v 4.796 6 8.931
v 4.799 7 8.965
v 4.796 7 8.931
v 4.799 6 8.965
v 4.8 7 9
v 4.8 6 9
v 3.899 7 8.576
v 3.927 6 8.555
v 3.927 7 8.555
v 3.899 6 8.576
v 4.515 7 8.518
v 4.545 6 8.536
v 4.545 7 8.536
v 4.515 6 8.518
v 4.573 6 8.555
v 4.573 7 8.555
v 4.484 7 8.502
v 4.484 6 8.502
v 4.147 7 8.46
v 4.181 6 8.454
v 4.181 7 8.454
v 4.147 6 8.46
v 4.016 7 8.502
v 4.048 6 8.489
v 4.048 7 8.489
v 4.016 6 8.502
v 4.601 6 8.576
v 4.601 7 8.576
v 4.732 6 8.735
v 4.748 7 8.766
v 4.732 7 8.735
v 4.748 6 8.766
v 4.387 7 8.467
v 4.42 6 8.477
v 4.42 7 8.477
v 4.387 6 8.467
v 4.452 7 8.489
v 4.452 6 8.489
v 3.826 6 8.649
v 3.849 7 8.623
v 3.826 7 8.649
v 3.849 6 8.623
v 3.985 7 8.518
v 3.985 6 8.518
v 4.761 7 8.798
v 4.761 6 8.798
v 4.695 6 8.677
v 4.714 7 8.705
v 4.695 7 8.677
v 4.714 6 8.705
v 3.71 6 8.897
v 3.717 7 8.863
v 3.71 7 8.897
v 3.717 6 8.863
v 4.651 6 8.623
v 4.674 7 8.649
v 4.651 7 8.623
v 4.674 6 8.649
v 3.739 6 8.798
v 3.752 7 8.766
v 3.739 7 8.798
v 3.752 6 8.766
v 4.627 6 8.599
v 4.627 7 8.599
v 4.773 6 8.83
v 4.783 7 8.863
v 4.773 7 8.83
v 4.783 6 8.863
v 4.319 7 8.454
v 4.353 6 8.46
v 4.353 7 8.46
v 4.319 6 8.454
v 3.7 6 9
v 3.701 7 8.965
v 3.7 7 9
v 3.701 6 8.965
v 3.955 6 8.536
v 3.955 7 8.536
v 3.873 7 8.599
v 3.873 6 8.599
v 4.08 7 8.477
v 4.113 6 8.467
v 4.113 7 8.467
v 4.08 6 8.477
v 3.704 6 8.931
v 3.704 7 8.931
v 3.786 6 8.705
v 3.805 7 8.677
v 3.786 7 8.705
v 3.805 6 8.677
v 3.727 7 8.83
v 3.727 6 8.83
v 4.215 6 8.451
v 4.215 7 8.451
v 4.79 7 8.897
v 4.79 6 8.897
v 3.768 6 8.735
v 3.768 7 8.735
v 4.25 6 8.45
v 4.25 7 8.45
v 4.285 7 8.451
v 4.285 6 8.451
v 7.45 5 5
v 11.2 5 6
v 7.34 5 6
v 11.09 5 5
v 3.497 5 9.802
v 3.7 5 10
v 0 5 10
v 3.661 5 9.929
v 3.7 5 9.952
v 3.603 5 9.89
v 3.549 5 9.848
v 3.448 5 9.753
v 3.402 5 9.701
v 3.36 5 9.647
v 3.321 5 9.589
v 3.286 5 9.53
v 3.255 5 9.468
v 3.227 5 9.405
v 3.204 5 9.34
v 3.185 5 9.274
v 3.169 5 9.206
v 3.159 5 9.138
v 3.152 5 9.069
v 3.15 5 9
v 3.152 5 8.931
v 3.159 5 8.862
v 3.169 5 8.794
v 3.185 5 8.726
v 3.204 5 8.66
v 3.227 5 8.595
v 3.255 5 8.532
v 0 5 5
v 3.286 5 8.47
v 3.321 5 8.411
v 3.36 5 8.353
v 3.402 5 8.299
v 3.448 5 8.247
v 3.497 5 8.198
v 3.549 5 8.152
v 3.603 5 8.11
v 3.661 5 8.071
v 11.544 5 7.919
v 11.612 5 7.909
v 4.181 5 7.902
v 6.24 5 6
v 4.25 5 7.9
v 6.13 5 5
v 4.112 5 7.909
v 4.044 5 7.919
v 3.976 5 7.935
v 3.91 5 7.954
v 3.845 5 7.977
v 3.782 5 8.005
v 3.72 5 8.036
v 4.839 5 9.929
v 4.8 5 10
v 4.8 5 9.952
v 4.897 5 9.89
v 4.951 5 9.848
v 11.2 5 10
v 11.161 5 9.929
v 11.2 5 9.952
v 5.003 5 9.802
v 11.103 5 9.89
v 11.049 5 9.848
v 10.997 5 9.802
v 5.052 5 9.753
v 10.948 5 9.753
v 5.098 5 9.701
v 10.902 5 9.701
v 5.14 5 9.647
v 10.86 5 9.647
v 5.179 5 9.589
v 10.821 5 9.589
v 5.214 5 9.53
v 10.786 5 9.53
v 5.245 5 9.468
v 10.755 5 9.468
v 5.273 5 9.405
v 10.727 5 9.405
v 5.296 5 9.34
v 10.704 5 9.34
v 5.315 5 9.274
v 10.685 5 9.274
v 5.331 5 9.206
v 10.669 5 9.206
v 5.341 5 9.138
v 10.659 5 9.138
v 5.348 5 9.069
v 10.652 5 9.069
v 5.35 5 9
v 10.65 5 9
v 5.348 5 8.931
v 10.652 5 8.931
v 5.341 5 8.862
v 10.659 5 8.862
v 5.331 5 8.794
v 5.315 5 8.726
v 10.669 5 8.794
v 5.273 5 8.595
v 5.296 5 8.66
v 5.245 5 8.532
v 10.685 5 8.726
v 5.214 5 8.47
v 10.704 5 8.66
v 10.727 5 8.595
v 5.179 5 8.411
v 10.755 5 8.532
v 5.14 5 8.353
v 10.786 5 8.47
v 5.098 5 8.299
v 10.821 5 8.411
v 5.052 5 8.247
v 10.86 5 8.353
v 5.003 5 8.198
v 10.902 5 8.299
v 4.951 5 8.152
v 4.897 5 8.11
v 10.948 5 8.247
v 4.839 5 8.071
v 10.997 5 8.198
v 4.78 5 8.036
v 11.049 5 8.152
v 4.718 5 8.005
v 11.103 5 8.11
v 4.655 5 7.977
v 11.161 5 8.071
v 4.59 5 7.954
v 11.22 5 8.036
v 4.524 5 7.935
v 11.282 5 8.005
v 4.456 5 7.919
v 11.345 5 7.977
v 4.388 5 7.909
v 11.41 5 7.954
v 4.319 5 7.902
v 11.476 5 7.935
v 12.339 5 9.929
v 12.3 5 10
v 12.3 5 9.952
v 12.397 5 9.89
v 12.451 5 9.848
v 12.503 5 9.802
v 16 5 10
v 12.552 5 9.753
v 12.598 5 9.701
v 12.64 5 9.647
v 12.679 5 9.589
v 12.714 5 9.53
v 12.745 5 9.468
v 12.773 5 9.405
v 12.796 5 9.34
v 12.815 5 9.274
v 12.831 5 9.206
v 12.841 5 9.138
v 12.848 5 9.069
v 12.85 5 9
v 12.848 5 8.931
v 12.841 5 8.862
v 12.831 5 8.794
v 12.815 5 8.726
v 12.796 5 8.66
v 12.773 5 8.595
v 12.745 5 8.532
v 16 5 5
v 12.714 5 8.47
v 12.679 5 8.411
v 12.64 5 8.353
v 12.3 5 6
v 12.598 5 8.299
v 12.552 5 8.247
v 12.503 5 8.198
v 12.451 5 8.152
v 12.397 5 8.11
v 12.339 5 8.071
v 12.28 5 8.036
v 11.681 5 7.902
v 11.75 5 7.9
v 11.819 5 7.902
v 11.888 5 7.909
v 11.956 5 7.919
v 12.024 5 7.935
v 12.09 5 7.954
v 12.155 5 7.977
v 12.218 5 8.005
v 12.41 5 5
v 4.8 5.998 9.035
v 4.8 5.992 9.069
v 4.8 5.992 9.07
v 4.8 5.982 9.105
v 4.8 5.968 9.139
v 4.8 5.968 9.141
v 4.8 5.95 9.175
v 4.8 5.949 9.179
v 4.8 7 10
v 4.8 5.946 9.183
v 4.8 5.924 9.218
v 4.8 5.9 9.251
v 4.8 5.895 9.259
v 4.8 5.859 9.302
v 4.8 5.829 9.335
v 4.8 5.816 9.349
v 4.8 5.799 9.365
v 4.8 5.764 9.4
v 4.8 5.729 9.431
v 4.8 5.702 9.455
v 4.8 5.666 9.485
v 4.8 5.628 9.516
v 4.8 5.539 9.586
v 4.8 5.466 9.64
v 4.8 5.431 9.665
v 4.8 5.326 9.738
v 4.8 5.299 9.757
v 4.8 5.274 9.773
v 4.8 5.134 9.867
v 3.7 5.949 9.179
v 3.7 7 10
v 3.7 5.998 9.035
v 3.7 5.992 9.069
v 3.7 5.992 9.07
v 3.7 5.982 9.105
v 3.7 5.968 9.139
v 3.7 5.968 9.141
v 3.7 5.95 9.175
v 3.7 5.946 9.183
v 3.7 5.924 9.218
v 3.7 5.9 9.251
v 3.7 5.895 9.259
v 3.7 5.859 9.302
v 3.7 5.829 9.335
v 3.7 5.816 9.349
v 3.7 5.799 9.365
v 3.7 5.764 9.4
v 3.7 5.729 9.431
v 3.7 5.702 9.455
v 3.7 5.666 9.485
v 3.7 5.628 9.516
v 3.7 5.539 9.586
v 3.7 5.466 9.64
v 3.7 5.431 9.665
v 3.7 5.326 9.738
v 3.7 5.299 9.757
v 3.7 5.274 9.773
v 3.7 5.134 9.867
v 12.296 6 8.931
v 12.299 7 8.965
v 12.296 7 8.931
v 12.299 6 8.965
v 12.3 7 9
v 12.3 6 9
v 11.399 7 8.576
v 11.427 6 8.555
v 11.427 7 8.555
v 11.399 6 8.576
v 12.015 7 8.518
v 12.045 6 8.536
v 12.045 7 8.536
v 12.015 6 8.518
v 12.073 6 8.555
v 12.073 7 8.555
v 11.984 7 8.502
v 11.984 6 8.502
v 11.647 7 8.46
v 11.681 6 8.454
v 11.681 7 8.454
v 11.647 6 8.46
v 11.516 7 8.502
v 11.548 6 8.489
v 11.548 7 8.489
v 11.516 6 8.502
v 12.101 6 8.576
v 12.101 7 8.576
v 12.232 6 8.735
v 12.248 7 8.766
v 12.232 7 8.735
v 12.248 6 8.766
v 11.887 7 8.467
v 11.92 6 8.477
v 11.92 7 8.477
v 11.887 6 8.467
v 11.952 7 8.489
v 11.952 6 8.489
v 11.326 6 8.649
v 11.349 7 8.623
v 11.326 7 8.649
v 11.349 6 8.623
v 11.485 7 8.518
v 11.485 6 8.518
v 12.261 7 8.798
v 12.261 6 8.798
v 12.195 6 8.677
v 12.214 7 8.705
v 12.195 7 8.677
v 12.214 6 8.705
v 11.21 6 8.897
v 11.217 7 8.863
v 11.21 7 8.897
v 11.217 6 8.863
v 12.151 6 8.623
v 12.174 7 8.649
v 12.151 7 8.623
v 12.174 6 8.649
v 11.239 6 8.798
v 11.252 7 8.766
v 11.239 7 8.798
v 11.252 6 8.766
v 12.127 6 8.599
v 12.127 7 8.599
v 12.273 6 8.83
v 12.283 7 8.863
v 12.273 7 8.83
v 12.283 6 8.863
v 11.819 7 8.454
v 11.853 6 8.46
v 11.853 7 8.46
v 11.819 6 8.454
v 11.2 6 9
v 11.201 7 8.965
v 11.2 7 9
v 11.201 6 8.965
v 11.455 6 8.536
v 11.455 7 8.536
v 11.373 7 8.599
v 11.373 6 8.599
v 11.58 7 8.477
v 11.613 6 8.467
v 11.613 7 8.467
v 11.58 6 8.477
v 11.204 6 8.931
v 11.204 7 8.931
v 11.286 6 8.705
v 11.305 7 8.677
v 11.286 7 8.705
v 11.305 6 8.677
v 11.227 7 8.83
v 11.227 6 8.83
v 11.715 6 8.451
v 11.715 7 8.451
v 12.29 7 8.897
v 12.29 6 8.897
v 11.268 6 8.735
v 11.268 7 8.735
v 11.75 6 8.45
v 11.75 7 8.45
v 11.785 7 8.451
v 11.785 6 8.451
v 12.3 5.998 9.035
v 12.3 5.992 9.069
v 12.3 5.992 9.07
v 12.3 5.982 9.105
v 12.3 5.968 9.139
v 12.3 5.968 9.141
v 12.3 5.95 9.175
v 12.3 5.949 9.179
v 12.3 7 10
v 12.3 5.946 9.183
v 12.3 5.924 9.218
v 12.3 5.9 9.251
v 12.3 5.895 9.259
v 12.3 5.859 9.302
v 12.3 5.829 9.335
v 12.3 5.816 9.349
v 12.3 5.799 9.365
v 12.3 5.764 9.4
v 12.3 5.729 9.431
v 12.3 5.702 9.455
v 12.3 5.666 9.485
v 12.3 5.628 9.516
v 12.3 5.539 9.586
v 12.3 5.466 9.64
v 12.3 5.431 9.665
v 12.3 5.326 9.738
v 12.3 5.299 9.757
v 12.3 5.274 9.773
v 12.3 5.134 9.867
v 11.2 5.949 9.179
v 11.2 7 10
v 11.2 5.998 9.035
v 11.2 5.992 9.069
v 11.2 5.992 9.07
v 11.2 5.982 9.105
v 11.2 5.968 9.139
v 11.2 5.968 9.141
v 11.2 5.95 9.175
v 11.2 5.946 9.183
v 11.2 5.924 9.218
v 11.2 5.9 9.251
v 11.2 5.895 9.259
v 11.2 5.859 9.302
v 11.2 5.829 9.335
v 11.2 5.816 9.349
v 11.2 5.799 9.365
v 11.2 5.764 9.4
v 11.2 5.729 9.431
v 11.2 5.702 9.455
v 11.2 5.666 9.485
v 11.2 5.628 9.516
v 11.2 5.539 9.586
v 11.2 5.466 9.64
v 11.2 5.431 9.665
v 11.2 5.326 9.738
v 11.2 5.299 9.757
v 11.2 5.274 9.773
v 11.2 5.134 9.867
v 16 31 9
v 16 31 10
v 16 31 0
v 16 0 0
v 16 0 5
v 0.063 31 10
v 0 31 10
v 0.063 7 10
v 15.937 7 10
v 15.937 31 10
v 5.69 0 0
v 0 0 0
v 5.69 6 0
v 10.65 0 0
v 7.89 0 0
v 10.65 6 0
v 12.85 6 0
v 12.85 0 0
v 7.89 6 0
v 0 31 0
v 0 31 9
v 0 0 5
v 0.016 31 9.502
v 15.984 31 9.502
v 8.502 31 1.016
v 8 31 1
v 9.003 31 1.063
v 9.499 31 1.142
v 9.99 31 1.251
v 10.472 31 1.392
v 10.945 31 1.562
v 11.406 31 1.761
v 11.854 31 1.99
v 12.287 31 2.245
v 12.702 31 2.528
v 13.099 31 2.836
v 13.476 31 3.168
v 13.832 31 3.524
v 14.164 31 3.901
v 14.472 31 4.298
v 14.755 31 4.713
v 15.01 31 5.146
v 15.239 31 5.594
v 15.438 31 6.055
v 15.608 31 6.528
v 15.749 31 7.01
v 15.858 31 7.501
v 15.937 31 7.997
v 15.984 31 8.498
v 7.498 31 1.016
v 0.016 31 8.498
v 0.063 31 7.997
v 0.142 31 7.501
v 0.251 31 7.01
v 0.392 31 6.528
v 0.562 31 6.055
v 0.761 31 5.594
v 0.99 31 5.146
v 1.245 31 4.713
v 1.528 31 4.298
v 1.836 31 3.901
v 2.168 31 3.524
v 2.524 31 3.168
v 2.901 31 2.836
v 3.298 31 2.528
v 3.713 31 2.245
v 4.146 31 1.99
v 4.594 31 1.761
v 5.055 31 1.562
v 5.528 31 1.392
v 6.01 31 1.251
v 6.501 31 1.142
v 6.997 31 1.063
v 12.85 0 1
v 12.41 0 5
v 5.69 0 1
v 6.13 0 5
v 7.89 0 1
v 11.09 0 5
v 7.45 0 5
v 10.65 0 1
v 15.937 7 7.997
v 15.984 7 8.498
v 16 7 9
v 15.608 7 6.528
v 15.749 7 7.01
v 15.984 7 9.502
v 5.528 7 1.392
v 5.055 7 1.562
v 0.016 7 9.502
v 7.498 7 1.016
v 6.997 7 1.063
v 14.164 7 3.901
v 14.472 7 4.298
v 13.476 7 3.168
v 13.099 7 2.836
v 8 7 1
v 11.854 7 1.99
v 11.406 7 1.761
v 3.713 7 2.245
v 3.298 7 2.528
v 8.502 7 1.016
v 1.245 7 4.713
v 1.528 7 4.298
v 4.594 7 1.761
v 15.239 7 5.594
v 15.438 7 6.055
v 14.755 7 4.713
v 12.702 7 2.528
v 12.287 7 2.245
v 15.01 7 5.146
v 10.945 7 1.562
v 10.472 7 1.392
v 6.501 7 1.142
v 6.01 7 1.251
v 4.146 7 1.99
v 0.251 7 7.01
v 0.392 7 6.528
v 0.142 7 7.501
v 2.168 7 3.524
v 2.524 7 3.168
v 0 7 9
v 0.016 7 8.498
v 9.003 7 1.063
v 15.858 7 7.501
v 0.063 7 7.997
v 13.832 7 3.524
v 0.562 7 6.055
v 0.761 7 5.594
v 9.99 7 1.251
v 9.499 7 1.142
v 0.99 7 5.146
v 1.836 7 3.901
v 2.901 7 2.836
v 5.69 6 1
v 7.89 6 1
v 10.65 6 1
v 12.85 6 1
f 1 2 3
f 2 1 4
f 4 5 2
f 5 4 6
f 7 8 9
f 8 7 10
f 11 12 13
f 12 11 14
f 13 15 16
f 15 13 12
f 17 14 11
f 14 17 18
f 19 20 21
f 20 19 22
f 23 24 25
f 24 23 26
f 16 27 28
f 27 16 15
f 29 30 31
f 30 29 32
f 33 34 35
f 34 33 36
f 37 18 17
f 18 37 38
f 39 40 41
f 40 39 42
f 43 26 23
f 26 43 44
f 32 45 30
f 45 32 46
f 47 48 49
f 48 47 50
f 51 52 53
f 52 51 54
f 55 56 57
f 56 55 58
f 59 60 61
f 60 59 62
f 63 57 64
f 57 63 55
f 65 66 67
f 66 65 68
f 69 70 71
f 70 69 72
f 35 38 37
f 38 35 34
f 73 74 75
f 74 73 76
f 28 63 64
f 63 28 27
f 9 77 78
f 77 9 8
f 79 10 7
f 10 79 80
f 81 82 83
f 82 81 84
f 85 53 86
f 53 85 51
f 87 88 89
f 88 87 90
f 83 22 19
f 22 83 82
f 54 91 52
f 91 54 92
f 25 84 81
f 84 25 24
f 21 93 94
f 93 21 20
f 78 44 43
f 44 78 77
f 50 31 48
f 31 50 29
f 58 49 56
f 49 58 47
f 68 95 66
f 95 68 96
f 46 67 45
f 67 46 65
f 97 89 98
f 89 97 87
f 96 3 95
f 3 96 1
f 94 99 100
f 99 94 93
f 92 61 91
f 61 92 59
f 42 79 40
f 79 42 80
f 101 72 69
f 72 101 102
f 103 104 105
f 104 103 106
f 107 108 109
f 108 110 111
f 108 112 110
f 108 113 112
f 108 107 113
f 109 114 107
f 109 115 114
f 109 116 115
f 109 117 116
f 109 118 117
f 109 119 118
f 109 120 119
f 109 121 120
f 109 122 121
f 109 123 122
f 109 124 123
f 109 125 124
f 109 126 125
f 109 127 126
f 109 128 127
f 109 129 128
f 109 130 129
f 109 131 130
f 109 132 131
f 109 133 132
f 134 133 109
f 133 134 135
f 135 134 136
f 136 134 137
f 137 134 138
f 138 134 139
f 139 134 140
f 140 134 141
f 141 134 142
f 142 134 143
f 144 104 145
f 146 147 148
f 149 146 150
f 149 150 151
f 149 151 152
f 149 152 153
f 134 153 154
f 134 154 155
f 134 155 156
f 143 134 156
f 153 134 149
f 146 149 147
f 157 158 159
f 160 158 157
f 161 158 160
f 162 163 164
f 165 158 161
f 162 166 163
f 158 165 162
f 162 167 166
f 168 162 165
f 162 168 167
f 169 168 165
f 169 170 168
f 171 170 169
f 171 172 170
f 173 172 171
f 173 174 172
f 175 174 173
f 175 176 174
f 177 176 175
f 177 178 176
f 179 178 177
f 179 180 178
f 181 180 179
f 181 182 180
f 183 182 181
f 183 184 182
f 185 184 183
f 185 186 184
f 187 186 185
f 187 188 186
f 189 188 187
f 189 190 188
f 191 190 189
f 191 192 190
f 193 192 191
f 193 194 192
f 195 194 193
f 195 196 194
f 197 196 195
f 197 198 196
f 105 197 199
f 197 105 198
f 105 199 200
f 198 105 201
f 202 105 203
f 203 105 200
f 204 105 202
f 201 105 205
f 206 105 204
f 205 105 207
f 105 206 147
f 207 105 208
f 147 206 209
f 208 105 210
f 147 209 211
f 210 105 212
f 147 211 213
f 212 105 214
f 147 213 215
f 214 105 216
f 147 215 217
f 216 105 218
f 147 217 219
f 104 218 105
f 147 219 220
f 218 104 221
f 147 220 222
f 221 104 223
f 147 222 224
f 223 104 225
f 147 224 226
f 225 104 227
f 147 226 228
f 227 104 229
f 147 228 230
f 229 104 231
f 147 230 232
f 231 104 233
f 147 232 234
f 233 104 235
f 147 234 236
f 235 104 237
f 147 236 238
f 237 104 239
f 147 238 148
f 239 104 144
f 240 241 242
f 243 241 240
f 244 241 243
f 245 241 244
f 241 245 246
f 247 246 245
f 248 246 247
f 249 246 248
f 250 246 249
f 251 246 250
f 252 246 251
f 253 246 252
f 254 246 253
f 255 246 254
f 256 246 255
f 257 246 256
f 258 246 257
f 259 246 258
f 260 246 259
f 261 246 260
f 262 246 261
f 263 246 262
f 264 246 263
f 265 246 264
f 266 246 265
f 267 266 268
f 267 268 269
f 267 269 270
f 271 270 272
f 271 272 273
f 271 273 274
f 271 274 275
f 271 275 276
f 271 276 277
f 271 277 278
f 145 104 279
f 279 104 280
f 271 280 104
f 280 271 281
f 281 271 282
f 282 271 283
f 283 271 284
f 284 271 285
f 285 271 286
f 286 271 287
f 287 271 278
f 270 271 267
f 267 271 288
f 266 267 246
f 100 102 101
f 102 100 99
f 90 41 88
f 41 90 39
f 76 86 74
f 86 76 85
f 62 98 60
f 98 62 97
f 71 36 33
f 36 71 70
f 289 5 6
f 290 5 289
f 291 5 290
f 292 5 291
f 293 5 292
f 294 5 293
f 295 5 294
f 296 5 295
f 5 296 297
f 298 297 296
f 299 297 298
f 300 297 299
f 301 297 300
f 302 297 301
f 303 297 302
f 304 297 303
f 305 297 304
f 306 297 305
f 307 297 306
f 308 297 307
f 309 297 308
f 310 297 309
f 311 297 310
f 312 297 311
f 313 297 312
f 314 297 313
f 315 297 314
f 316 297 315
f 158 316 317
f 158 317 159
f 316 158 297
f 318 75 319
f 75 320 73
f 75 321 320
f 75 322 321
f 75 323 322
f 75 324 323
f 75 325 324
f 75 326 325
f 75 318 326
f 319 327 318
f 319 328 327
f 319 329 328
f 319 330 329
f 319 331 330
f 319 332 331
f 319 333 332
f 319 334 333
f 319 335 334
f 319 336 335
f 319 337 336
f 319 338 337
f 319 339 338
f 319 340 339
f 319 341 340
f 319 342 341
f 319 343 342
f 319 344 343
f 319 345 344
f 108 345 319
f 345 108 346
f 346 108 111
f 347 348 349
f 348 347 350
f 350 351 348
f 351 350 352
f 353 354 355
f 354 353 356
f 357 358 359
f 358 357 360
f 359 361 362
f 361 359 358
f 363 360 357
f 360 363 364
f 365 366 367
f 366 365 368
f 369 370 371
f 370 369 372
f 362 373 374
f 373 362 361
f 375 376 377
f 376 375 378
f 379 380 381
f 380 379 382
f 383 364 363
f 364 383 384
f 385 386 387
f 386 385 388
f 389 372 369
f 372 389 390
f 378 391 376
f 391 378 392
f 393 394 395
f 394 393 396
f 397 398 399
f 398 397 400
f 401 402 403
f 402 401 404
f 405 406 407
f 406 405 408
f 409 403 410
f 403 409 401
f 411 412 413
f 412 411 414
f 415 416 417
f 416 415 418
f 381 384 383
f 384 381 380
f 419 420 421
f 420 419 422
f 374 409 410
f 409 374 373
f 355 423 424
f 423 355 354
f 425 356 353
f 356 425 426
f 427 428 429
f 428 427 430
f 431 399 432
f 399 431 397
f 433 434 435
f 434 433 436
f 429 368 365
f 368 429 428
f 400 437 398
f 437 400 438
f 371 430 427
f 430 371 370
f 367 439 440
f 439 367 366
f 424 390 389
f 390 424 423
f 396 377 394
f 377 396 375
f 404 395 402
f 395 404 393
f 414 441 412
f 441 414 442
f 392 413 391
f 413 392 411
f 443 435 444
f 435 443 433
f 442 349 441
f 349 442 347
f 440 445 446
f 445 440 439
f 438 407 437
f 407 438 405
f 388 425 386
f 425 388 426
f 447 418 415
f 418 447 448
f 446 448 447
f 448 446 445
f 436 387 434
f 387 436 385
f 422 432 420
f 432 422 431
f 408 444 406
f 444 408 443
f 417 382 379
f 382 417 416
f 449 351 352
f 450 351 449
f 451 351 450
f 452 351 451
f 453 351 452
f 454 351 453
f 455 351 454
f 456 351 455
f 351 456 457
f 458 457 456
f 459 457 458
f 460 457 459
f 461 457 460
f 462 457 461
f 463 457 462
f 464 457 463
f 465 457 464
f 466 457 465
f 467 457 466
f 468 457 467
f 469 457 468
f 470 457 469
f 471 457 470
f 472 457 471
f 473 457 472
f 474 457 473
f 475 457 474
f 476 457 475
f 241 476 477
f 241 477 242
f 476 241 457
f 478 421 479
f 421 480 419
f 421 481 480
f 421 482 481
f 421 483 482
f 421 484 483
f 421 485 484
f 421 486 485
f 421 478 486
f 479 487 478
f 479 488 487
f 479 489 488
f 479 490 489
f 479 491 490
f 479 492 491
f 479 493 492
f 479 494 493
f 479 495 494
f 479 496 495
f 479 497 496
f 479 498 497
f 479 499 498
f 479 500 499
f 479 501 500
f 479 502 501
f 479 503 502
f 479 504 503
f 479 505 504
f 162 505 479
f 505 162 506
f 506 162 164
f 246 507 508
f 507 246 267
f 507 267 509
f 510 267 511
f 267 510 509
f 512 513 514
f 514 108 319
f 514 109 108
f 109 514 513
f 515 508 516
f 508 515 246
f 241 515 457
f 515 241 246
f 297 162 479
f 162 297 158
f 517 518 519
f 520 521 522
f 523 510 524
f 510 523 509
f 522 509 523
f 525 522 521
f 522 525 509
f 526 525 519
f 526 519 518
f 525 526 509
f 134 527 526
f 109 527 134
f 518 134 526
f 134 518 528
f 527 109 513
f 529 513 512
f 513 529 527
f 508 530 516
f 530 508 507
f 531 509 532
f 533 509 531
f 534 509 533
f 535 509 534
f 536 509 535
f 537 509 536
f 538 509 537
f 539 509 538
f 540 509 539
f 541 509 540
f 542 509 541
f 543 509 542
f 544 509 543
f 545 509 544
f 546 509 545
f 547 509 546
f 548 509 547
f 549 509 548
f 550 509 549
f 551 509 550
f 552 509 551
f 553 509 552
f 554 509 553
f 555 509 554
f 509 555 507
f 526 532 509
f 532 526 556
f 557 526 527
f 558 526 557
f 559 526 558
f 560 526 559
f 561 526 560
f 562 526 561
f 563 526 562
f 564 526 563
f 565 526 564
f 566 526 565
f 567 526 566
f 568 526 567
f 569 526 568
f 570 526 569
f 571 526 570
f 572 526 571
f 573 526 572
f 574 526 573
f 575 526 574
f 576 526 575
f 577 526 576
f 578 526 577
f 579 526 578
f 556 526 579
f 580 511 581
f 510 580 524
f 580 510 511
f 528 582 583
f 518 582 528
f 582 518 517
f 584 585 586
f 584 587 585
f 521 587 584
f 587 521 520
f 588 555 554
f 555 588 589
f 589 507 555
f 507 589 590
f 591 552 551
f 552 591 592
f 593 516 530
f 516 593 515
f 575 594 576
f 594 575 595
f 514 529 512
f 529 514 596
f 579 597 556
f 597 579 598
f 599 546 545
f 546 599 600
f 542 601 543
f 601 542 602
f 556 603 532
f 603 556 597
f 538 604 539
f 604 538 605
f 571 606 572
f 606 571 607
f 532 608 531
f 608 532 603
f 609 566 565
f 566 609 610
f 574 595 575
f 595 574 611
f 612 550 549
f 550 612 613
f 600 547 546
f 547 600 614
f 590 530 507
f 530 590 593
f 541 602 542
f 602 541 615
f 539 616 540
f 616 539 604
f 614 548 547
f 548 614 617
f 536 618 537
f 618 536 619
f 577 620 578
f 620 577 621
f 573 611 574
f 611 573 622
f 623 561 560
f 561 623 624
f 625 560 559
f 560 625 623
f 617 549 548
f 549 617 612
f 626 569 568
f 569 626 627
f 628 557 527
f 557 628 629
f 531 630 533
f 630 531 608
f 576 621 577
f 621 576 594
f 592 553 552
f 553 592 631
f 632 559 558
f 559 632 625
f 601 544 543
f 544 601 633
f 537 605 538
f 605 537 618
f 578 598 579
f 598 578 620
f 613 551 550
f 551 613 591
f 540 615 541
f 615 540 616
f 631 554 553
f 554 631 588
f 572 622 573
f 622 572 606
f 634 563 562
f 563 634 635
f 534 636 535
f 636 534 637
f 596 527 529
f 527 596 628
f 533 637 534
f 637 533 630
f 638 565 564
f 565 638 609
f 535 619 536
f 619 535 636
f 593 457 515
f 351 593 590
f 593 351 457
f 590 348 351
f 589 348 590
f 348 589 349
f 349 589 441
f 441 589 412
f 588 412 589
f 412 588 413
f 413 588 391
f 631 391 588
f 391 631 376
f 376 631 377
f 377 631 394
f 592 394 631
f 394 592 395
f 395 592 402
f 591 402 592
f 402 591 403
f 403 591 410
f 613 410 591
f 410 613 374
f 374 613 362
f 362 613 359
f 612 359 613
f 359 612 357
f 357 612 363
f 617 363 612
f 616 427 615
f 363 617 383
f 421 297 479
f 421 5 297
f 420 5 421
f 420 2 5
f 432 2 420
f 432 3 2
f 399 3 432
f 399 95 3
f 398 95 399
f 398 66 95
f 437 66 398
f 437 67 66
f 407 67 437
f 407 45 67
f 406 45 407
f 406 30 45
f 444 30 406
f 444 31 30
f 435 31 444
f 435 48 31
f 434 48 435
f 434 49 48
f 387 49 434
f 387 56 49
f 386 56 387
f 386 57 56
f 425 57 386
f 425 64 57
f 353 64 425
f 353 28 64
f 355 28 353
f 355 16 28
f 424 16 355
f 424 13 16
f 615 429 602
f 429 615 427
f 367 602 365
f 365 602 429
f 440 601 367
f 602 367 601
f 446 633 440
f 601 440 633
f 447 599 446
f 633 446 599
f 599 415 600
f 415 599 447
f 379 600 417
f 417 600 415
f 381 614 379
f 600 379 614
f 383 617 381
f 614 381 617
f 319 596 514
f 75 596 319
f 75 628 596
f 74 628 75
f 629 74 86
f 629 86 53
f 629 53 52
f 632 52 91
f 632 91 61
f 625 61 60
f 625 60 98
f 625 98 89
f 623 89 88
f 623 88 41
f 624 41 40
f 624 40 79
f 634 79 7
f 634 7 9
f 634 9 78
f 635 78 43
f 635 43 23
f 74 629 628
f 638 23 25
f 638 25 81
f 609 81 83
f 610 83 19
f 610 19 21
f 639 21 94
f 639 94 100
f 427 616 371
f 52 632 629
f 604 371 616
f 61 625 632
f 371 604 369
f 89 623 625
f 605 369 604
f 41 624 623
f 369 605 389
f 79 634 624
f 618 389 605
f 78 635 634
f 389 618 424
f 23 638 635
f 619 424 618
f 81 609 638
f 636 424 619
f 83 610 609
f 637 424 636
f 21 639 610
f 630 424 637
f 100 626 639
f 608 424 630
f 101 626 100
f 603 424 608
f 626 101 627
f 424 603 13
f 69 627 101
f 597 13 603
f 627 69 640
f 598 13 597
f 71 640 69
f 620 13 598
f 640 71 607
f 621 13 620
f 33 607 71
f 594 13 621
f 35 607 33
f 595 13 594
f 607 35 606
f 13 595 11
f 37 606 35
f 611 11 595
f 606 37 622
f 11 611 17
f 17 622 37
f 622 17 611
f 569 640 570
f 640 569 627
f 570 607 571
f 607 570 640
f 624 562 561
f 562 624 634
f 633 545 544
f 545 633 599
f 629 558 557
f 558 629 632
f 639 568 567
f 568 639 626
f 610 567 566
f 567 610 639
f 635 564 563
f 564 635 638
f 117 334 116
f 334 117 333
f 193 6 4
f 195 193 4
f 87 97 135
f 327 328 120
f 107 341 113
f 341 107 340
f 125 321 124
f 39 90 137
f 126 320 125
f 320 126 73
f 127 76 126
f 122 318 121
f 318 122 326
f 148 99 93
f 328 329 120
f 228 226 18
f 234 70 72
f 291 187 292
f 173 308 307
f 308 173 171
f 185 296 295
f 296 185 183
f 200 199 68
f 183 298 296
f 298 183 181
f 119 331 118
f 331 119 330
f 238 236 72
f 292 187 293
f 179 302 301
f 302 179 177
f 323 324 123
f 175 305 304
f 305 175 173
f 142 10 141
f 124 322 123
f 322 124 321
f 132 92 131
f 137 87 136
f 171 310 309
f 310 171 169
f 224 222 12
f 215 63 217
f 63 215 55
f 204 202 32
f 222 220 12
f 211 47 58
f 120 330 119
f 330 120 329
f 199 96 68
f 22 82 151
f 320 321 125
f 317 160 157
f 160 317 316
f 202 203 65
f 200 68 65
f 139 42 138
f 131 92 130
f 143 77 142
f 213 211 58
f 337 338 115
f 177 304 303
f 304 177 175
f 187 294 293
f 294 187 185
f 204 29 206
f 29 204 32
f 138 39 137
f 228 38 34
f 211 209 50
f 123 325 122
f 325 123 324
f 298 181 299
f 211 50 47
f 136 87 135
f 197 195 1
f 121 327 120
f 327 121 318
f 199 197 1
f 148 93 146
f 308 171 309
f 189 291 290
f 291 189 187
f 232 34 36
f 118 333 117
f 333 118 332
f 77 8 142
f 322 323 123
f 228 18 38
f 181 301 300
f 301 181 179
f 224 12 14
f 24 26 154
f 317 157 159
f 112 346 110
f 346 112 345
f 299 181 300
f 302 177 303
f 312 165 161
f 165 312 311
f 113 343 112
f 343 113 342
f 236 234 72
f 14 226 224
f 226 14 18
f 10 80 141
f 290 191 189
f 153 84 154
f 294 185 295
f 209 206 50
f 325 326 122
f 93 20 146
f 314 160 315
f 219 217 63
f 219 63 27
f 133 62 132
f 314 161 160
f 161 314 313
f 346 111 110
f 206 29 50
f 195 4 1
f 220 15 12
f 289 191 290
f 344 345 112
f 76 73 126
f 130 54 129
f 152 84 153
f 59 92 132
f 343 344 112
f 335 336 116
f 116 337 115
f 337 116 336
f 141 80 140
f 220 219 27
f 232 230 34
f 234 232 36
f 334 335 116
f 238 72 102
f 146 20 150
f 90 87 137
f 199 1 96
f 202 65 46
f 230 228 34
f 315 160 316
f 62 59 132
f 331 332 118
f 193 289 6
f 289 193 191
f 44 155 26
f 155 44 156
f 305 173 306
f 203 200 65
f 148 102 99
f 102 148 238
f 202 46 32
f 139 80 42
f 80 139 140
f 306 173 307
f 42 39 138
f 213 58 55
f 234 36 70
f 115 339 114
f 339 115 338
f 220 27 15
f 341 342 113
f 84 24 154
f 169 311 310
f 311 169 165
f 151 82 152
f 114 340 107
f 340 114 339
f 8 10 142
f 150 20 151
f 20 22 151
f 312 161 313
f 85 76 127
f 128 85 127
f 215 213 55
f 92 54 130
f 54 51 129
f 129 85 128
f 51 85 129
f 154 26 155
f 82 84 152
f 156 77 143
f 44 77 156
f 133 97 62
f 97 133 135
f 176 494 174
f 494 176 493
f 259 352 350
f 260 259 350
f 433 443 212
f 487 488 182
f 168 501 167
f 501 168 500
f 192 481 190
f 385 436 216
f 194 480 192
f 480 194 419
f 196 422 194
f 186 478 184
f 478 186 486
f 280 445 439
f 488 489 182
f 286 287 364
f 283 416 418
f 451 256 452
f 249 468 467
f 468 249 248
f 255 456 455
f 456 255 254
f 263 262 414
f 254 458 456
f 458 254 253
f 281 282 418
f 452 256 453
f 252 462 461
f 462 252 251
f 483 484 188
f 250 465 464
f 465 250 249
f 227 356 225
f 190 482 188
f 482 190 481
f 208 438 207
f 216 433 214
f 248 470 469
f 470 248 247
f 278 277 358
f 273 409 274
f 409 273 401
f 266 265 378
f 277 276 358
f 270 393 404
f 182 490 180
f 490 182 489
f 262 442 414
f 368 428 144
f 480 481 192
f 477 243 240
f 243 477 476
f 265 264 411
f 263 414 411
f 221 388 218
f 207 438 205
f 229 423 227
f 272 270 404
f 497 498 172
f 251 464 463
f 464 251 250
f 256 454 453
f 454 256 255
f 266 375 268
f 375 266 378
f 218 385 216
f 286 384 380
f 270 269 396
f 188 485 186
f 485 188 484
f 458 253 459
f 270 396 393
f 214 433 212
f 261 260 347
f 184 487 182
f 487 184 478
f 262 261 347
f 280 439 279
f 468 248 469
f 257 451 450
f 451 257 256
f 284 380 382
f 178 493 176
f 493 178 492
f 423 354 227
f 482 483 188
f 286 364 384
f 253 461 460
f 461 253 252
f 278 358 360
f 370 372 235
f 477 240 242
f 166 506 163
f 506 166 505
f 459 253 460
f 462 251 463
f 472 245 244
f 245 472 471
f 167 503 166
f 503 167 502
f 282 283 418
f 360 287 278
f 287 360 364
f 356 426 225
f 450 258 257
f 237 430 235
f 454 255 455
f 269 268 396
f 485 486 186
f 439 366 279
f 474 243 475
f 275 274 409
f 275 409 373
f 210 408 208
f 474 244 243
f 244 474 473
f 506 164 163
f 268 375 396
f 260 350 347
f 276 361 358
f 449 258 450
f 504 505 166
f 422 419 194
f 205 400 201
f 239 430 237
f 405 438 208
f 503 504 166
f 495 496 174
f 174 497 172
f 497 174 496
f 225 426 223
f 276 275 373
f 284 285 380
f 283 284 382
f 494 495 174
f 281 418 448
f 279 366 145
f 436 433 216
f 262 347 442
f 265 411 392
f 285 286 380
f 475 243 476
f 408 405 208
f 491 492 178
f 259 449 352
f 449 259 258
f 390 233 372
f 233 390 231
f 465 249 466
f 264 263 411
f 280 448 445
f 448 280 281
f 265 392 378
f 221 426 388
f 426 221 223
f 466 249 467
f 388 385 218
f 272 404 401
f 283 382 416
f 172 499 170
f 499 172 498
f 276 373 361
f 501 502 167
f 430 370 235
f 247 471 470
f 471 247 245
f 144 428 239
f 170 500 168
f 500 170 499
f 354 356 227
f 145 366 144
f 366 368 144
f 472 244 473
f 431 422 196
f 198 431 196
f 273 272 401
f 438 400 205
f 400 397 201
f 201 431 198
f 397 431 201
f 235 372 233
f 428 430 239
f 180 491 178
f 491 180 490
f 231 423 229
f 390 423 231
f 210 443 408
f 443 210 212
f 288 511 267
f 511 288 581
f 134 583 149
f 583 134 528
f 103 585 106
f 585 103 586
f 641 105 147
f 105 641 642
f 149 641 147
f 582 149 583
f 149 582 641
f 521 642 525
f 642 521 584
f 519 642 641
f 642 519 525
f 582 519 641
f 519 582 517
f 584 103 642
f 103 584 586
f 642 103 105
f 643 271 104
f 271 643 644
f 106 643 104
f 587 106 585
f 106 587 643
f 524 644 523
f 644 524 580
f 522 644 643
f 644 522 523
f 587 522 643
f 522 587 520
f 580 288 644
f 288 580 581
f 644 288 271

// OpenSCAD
$fn=100;
/*
Customizable Capacitor leg bending tool
Brian Khuu 2019

This assist in bending capacitor legs in a consistent manner.

Default Values based on a 30F Supercap https://docs-apac.rs-online.com/webdocs/14e3/0900766b814e39c2.pdf

*/


/** Capacitor Spec **/

// Capacitor Diameter
capd=16;

// Capacitor Length
capl=31;

// Capacitor Pin Spacing
cap_pin_spacing=7.5;

// Capacitor Pin Diameter
cap_pin_dia=1.1;

/** Object Spec **/

// Base Height
base_h=1;

// Leg Guide Length
leg_guide=5;

/** Pin Offset **/

// Pin offset of left leg
pin_offset_1 = 1;

// Pin offset of right leg
pin_offset_2 = 0;

// Pin Pitch Increment
pin_pitch = 2.54;

/* Calc */
cap_radius=capd/2;

difference()
{
    cube([capd,capl,cap_radius+base_h+1]);
    
    // Cap Guide
    translate([cap_radius,leg_guide+2,cap_radius+base_h])
    rotate([-90,0,0])
    cylinder(r=capd/2, h=capl);
    
    // Cap Pin
    translate([cap_radius-cap_pin_spacing/2,leg_guide,cap_radius+base_h])
    union()
    {
      rotate([-90,0,0])
        cylinder(r=cap_pin_dia/2, h=4);
      translate([-cap_pin_dia/2,-0.5,0])
        cube([cap_pin_dia,4,2]);
    }

    translate([cap_radius+cap_pin_spacing/2,leg_guide,cap_radius+base_h])
    union()
    {
      rotate([-90,0,0])
        cylinder(r=cap_pin_dia/2, h=4);
      translate([-cap_pin_dia/2,-0.5,0])
        cube([cap_pin_dia,4,2]);
    }
    
    // Cap Pin Bevel
    translate([cap_radius-cap_pin_spacing/2,leg_guide,cap_radius+base_h])
    rotate([-90,0,0])
    cylinder(r1=cap_pin_dia, r2=cap_pin_dia/2, h=1);
    
    translate([cap_radius+cap_pin_spacing/2,leg_guide,cap_radius+base_h])
    rotate([-90,0,0])
    cylinder(r1=cap_pin_dia, r2=cap_pin_dia/2, h=1);
    
    // Jig Ledge
    translate([0,0,base_h+cap_radius/2])
    cube([capd,leg_guide,cap_radius+base_h]);

    // Pin Gap
    hull()
    {
      translate([cap_radius-cap_pin_spacing/2 - cap_pin_dia/2 + pin_offset_1*pin_pitch,0,base_h+cap_radius/2])
        cube([cap_pin_dia,leg_guide,1]);        
      translate([cap_radius-cap_pin_spacing/2 - cap_pin_dia + pin_offset_1*pin_pitch,0,0])
        cube([cap_pin_dia*2,leg_guide+1,1]);        
    }

    hull()
    {
      translate([cap_radius+cap_pin_spacing/2 - cap_pin_dia/2 + pin_offset_2*pin_pitch,0,base_h+cap_radius/2])
        cube([cap_pin_dia,leg_guide,1]);
      translate([cap_radius+cap_pin_spacing/2 - cap_pin_dia + pin_offset_2*pin_pitch,0,0])
        cube([cap_pin_dia*2,leg_guide+1,1]);        
    }
    
}
